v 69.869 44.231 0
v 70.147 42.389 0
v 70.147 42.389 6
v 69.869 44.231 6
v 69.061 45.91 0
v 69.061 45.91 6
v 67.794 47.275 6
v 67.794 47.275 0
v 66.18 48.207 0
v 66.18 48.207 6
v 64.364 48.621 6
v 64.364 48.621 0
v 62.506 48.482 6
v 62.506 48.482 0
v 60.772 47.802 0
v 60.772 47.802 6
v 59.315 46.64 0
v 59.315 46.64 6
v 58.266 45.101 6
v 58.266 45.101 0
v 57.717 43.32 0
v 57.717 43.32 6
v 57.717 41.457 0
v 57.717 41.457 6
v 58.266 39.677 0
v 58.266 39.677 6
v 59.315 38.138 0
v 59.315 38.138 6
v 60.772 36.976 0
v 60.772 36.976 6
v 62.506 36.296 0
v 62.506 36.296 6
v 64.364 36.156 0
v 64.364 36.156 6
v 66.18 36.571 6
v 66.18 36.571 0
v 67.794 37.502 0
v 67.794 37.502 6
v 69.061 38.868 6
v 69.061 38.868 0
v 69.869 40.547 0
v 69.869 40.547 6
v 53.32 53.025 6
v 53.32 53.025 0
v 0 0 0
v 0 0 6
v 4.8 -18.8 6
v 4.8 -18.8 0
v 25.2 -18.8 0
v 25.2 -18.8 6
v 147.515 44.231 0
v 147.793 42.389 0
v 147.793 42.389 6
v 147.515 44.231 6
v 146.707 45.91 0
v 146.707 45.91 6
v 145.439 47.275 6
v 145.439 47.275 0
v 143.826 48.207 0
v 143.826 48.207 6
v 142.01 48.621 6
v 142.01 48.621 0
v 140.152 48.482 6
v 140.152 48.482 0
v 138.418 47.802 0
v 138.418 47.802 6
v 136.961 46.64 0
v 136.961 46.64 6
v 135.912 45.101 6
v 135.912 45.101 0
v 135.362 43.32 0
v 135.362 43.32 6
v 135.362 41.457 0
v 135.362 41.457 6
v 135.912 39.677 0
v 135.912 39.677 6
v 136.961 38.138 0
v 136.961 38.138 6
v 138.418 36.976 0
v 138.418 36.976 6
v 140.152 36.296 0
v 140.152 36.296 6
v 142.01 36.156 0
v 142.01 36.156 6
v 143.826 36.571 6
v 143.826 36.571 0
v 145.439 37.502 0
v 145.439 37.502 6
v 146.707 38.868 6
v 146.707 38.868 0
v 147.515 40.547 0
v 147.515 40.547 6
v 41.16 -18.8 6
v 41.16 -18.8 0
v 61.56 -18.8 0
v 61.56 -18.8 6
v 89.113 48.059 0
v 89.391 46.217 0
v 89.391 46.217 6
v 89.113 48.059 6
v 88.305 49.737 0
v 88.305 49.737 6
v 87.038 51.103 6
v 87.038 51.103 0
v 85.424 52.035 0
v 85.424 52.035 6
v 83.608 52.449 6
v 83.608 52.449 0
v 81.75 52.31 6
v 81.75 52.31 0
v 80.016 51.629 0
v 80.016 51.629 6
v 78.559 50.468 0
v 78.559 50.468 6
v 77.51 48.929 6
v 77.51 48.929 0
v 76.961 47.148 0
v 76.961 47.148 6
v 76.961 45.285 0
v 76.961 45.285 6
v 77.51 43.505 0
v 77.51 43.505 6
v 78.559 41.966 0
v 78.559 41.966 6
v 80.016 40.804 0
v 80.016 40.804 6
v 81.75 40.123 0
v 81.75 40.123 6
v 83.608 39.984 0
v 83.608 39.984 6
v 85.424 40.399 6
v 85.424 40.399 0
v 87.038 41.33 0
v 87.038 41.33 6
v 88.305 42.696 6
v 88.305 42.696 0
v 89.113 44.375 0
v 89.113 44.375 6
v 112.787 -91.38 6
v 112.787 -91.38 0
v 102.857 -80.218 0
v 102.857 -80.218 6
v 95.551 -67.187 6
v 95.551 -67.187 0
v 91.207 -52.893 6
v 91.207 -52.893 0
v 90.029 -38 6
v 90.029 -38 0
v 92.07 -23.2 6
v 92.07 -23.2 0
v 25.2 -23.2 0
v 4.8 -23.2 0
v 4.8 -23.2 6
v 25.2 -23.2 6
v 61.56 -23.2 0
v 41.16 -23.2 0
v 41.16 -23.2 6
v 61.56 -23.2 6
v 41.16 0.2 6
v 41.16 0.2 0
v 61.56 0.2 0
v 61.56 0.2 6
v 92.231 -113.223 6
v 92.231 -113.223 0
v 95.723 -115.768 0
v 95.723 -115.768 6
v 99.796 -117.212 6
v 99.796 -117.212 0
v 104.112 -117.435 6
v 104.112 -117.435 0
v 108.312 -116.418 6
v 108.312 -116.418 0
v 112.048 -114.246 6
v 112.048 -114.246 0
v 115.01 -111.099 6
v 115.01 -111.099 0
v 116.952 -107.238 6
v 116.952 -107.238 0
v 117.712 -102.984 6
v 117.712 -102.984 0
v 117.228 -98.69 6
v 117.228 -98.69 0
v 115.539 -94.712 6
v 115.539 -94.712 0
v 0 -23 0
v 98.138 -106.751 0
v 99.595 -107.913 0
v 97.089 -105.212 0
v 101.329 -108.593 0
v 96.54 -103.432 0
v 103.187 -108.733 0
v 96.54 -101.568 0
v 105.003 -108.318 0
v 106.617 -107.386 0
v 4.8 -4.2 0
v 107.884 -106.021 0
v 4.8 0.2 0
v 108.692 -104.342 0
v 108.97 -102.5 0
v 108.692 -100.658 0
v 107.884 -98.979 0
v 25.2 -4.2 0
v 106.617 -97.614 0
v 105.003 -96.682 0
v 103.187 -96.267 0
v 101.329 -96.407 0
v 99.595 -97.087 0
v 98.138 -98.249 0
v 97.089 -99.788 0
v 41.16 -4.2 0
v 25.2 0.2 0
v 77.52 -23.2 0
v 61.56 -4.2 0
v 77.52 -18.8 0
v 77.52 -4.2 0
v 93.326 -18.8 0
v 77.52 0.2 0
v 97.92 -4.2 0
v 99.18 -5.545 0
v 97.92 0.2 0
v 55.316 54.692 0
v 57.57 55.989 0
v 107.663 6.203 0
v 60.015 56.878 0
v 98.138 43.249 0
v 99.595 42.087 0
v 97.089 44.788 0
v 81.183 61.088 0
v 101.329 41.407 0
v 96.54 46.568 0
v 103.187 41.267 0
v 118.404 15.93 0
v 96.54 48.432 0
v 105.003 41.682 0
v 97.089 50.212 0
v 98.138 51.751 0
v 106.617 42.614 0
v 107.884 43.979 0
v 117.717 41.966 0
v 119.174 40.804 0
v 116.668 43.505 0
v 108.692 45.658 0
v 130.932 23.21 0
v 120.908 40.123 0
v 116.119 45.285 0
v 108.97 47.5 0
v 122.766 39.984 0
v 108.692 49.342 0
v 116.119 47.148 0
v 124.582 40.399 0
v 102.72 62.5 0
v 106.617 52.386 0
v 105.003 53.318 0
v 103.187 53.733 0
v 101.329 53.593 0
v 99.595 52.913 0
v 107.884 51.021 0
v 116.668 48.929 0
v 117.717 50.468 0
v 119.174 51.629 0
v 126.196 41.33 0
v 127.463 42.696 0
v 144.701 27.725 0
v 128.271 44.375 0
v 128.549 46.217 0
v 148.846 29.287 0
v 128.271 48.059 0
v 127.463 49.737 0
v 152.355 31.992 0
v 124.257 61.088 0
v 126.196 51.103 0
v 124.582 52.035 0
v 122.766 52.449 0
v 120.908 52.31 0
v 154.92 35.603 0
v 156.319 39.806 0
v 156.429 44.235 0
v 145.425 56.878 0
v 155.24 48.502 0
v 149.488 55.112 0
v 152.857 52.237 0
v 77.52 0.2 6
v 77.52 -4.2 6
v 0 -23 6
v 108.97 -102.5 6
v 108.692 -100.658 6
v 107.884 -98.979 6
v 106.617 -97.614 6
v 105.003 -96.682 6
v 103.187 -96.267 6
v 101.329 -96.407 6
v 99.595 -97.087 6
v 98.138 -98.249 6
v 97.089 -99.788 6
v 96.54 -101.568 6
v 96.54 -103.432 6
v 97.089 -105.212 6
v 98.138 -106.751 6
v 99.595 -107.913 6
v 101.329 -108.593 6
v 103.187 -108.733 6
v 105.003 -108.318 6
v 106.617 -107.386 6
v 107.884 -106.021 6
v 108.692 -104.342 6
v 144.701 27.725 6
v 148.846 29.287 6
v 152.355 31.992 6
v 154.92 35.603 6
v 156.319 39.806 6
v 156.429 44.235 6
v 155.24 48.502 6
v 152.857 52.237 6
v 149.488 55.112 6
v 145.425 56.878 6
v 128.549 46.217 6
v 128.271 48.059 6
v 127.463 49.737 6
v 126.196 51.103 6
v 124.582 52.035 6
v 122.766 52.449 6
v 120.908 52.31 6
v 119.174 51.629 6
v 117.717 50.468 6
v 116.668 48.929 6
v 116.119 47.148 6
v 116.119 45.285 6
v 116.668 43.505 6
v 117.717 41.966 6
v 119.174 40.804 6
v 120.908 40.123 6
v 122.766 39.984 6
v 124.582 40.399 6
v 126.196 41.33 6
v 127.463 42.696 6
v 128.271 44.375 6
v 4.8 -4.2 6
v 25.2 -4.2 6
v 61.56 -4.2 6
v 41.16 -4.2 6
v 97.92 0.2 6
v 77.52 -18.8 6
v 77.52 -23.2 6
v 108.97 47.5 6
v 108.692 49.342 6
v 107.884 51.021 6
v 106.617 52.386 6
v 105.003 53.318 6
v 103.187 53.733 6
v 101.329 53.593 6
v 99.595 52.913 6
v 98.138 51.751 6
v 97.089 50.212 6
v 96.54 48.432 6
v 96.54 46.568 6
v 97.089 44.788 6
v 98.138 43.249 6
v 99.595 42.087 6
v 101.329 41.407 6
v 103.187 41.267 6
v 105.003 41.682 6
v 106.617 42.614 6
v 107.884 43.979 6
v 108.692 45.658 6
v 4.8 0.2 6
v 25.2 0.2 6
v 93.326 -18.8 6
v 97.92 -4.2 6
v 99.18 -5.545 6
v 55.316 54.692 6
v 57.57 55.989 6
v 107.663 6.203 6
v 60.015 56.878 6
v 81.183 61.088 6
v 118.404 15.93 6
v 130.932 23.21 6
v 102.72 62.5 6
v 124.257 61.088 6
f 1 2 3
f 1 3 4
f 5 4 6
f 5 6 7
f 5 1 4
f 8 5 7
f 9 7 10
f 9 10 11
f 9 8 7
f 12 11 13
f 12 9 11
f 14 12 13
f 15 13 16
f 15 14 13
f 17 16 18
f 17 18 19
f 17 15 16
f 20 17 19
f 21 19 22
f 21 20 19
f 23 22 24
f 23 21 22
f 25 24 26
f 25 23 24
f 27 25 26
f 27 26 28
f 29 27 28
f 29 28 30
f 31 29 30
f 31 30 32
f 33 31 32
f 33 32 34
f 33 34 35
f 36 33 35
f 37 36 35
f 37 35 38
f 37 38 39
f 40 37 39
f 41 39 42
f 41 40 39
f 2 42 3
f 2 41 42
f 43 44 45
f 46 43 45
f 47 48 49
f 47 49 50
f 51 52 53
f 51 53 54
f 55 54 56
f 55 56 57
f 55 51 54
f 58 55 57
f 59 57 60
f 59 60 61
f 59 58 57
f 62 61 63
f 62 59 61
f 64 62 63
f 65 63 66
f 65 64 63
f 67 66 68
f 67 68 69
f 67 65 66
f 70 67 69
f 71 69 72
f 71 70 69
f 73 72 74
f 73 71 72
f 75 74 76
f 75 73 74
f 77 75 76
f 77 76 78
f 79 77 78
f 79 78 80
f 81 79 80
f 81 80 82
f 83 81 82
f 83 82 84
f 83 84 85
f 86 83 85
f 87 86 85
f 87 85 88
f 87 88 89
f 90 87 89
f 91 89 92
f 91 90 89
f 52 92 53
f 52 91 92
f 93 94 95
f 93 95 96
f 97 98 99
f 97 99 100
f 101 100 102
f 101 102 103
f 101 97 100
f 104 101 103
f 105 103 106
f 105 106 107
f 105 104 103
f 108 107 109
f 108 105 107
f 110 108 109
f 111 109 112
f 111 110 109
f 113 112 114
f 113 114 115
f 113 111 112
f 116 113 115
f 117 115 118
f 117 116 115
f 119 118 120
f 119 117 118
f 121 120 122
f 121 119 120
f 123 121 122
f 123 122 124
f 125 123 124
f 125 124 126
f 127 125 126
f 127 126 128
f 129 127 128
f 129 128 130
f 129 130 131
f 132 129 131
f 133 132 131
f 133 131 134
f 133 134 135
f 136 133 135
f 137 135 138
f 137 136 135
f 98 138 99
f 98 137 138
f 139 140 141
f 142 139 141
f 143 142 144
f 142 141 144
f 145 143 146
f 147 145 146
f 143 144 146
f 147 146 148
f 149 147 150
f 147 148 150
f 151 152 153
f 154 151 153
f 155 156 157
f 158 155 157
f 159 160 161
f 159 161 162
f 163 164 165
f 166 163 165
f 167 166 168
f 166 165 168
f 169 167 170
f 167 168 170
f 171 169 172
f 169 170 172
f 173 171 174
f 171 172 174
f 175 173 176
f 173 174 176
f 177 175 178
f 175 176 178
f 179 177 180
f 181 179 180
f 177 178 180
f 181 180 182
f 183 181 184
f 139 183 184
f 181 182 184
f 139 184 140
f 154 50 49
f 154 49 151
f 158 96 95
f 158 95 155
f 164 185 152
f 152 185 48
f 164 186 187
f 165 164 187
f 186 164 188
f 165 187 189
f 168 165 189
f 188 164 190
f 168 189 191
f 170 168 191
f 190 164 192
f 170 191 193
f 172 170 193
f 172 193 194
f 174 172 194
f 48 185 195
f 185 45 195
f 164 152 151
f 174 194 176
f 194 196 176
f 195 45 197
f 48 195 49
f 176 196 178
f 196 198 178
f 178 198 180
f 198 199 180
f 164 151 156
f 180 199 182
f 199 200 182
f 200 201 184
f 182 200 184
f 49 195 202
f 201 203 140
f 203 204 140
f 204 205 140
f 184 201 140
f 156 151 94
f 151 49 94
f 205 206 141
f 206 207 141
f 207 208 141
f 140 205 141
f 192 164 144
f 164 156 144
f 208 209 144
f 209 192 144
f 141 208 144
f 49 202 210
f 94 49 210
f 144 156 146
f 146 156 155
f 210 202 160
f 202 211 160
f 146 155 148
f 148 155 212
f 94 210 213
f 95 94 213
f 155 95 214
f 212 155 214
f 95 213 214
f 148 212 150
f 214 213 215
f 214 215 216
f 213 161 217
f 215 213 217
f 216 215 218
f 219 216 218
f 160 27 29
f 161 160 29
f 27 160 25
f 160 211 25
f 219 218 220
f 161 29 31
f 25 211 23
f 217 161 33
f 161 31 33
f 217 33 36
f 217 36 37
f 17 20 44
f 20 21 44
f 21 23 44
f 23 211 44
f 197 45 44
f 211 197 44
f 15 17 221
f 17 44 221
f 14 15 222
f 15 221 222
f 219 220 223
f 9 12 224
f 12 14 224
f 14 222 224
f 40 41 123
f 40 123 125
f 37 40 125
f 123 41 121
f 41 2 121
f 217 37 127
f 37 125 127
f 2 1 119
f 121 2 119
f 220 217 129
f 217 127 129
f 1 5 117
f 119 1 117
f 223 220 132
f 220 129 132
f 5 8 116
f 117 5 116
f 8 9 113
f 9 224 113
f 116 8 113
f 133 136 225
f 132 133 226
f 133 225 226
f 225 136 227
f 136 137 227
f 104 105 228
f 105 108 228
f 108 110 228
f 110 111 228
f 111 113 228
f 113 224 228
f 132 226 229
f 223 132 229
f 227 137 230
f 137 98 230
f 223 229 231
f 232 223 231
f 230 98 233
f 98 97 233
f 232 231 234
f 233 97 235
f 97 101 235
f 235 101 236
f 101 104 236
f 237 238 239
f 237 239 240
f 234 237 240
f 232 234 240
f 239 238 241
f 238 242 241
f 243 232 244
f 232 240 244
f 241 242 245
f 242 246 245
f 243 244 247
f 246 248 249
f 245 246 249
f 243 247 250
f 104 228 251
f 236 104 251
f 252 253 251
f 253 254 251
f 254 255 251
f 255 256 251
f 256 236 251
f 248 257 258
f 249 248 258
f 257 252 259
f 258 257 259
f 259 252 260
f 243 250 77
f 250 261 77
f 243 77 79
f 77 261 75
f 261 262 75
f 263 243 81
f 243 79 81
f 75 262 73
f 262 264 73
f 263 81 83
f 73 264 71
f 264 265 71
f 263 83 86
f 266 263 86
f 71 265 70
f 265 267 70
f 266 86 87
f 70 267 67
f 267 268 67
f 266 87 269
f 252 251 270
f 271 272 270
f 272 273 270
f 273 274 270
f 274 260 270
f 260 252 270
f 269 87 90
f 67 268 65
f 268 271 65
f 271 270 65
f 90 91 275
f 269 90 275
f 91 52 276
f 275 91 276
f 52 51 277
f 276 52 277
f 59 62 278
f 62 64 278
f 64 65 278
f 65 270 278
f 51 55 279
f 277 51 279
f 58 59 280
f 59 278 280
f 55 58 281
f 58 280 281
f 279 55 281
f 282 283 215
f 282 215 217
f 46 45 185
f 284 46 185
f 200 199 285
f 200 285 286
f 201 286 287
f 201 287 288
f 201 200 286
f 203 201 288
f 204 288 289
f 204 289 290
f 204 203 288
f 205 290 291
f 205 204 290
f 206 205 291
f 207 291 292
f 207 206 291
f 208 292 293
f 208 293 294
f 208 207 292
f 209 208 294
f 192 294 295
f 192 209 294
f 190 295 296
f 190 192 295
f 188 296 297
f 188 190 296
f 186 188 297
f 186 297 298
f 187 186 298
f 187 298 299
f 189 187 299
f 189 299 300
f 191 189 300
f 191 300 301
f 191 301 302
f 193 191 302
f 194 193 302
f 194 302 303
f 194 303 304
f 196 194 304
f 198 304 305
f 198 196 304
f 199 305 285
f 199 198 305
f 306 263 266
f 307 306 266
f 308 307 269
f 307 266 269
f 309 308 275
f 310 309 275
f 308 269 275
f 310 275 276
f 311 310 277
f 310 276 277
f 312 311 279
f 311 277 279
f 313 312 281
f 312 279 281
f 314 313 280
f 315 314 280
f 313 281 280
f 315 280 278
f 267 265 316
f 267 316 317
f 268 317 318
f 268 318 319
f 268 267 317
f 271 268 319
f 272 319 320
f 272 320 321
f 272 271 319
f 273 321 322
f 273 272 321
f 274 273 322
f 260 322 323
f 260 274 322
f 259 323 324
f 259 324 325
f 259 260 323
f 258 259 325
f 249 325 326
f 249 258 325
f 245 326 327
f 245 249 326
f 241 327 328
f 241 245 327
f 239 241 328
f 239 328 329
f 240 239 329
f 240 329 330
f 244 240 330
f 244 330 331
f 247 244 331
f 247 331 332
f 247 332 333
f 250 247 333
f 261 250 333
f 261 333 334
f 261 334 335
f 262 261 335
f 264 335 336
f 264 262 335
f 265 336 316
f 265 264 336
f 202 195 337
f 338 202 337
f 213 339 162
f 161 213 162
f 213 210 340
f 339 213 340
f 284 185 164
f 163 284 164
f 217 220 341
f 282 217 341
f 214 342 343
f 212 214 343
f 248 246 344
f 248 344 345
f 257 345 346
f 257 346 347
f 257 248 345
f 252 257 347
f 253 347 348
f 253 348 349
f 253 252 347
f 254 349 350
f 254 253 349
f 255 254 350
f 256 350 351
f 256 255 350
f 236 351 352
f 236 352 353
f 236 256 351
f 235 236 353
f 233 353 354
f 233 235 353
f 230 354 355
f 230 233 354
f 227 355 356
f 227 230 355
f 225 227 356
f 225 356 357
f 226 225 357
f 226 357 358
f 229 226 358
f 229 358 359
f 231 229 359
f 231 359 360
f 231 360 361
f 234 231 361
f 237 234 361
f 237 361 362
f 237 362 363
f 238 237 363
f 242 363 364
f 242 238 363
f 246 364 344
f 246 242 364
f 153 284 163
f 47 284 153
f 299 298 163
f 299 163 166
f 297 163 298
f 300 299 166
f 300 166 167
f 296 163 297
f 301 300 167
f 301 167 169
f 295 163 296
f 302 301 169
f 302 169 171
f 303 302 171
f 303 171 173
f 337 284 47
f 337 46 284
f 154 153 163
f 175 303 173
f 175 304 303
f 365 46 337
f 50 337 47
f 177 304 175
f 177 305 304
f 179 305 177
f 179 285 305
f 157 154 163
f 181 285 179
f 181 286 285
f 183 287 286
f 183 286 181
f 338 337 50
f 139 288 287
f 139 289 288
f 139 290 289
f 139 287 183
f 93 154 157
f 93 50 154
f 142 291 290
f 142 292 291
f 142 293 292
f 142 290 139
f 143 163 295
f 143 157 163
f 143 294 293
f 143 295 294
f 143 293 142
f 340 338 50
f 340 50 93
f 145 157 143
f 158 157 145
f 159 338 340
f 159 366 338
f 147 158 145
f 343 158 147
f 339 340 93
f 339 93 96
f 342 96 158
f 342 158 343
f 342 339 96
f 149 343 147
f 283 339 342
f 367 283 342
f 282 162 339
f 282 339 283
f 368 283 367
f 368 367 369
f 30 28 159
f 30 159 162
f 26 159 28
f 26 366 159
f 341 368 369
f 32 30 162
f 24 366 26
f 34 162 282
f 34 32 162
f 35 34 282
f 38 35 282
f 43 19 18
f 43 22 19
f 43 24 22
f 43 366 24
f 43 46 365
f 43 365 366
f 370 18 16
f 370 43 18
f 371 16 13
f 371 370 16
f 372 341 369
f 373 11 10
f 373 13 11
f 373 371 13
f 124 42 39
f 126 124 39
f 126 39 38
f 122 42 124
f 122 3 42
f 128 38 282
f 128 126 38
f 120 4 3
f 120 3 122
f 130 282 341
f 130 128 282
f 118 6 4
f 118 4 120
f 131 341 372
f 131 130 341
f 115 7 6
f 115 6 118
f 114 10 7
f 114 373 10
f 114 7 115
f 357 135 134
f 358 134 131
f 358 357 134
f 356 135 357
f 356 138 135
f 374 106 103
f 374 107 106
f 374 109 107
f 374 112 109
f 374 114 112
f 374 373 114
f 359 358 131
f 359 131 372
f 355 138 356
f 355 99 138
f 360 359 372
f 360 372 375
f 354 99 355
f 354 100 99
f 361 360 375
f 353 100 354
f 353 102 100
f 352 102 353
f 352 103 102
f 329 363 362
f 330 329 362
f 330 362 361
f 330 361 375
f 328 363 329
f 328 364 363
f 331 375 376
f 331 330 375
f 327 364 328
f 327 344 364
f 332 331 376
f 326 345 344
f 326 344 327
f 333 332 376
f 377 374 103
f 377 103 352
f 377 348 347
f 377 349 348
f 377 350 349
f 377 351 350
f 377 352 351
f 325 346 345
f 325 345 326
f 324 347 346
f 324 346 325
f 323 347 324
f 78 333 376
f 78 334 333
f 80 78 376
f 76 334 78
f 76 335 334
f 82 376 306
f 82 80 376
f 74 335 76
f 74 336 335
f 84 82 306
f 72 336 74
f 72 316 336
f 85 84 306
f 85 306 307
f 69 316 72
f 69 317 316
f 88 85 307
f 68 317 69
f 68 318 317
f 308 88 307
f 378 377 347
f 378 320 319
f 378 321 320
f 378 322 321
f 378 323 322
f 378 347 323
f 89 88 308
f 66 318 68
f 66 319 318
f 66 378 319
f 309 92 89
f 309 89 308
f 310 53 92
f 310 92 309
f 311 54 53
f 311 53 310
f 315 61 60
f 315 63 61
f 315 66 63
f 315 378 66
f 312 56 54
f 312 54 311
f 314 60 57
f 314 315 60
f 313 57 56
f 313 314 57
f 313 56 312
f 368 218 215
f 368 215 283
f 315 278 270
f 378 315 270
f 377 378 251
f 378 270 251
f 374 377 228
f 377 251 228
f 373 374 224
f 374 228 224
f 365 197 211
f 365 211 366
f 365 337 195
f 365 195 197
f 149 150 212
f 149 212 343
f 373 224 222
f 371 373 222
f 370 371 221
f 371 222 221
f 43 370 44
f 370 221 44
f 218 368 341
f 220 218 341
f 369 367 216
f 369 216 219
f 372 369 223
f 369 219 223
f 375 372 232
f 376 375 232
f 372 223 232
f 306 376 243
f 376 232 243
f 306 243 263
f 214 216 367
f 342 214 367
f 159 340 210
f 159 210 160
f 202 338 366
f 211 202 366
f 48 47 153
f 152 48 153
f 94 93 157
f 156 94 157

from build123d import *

# Parameters (mm, degrees)
SKETCH_1_R             = 6.25
SM_BASE_FLANGE_1_DEPTH = 6
OTHER_START            = 4.8
OTHER_1_OUTLINE_W      = 4.4
OTHER_1_OUTLINE_H      = 6
OTHER_1_DEPTH          = 20.4
OTHER_START_2          = 41.159902189
OTHER_1_2_OUTLINE_W    = 4.4
OTHER_1_2_OUTLINE_H    = 6
OTHER_1_2_DEPTH        = 20.4
OTHER_START_3          = 77.519804378
OTHER_1_3_OUTLINE_W    = 4.4
OTHER_1_3_OUTLINE_H    = 6
OTHER_1_3_DEPTH        = 20.4


# Read off the part's stored shape, not the designer's step: Выступы и прорези-Прорезь1
# Sheet-metal steps are written as plain solids
with BuildPart() as part:
    # Sketch 1 → Базовая кромка1 (new body)
    with BuildSketch(Plane.XY):
        with BuildLine():
            Line((0, 0), (0, -23))
            Line((0, -23), (92.230562732, -113.222677357))
            ThreePointArc((92.230562732, -113.222677357), (113.643192103, -112.780058395), (112.786839702, -91.379982025))
            ThreePointArc((112.786839702, -91.379982025), (92.360596545, -22.078545096), (144.700960487, 27.725138224))
            ThreePointArc((144.700960487, 27.725138224), (156.538037696, 42.016473572), (145.424946819, 56.877761338))
            ThreePointArc((145.424946819, 56.877761338), (102.719804378, 62.5), (60.014661936, 56.877761338))
            ThreePointArc((60.014661936, 56.877761338), (56.414969483, 55.389643277), (53.319804477, 53.024852653))
            Line((53.319804477, 53.024852653), (0, 0))
        make_face()
        with Locations((102.719804378, -102.5)):
            Circle(SKETCH_1_R, mode=Mode.SUBTRACT)
        with Locations((141.542661143, 42.388873943)):
            Circle(SKETCH_1_R, mode=Mode.SUBTRACT)
        with Locations((122.298733211, 46.216729206)):
            Circle(SKETCH_1_R, mode=Mode.SUBTRACT)
        with Locations((102.719804378, 47.5)):
            Circle(SKETCH_1_R, mode=Mode.SUBTRACT)
        with Locations((83.140875544, 46.216729206)):
            Circle(SKETCH_1_R, mode=Mode.SUBTRACT)
        with Locations((63.896947612, 42.388873943)):
            Circle(SKETCH_1_R, mode=Mode.SUBTRACT)
    extrude(amount=SM_BASE_FLANGE_1_DEPTH)

    # Other 1 outline → Other 1 (cut)
    with BuildSketch(Plane.YZ.offset(OTHER_START)):
        with Locations((-2, 3)):
            Rectangle(OTHER_1_OUTLINE_W, OTHER_1_OUTLINE_H)
    other_1 = extrude(amount=OTHER_1_DEPTH, mode=Mode.SUBTRACT)

    # Other 1 2 outline → Other 1 2 (cut)
    with BuildSketch(Plane.YZ.offset(OTHER_START_2)):
        with Locations((-2, 3)):
            Rectangle(OTHER_1_2_OUTLINE_W, OTHER_1_2_OUTLINE_H)
    other_1_2 = extrude(amount=OTHER_1_2_DEPTH, mode=Mode.SUBTRACT)

    # Other 1 3 outline → Other 1 3 (cut)
    with BuildSketch(Plane.YZ.offset(OTHER_START_3)):
        with Locations((-2, 3)):
            Rectangle(OTHER_1_3_OUTLINE_W, OTHER_1_3_OUTLINE_H)
    other_1_3 = extrude(amount=OTHER_1_3_DEPTH, mode=Mode.SUBTRACT)

    # Зеркальное отражение1: Other 1, Other 1 2, Other 1 3 across plane
    add(other_1.mirror(Plane.ZX.offset(-11.5)), mode=Mode.SUBTRACT)
    add(other_1_2.mirror(Plane.ZX.offset(-11.5)), mode=Mode.SUBTRACT)
    add(other_1_3.mirror(Plane.ZX.offset(-11.5)), mode=Mode.SUBTRACT)


solid = part.part
